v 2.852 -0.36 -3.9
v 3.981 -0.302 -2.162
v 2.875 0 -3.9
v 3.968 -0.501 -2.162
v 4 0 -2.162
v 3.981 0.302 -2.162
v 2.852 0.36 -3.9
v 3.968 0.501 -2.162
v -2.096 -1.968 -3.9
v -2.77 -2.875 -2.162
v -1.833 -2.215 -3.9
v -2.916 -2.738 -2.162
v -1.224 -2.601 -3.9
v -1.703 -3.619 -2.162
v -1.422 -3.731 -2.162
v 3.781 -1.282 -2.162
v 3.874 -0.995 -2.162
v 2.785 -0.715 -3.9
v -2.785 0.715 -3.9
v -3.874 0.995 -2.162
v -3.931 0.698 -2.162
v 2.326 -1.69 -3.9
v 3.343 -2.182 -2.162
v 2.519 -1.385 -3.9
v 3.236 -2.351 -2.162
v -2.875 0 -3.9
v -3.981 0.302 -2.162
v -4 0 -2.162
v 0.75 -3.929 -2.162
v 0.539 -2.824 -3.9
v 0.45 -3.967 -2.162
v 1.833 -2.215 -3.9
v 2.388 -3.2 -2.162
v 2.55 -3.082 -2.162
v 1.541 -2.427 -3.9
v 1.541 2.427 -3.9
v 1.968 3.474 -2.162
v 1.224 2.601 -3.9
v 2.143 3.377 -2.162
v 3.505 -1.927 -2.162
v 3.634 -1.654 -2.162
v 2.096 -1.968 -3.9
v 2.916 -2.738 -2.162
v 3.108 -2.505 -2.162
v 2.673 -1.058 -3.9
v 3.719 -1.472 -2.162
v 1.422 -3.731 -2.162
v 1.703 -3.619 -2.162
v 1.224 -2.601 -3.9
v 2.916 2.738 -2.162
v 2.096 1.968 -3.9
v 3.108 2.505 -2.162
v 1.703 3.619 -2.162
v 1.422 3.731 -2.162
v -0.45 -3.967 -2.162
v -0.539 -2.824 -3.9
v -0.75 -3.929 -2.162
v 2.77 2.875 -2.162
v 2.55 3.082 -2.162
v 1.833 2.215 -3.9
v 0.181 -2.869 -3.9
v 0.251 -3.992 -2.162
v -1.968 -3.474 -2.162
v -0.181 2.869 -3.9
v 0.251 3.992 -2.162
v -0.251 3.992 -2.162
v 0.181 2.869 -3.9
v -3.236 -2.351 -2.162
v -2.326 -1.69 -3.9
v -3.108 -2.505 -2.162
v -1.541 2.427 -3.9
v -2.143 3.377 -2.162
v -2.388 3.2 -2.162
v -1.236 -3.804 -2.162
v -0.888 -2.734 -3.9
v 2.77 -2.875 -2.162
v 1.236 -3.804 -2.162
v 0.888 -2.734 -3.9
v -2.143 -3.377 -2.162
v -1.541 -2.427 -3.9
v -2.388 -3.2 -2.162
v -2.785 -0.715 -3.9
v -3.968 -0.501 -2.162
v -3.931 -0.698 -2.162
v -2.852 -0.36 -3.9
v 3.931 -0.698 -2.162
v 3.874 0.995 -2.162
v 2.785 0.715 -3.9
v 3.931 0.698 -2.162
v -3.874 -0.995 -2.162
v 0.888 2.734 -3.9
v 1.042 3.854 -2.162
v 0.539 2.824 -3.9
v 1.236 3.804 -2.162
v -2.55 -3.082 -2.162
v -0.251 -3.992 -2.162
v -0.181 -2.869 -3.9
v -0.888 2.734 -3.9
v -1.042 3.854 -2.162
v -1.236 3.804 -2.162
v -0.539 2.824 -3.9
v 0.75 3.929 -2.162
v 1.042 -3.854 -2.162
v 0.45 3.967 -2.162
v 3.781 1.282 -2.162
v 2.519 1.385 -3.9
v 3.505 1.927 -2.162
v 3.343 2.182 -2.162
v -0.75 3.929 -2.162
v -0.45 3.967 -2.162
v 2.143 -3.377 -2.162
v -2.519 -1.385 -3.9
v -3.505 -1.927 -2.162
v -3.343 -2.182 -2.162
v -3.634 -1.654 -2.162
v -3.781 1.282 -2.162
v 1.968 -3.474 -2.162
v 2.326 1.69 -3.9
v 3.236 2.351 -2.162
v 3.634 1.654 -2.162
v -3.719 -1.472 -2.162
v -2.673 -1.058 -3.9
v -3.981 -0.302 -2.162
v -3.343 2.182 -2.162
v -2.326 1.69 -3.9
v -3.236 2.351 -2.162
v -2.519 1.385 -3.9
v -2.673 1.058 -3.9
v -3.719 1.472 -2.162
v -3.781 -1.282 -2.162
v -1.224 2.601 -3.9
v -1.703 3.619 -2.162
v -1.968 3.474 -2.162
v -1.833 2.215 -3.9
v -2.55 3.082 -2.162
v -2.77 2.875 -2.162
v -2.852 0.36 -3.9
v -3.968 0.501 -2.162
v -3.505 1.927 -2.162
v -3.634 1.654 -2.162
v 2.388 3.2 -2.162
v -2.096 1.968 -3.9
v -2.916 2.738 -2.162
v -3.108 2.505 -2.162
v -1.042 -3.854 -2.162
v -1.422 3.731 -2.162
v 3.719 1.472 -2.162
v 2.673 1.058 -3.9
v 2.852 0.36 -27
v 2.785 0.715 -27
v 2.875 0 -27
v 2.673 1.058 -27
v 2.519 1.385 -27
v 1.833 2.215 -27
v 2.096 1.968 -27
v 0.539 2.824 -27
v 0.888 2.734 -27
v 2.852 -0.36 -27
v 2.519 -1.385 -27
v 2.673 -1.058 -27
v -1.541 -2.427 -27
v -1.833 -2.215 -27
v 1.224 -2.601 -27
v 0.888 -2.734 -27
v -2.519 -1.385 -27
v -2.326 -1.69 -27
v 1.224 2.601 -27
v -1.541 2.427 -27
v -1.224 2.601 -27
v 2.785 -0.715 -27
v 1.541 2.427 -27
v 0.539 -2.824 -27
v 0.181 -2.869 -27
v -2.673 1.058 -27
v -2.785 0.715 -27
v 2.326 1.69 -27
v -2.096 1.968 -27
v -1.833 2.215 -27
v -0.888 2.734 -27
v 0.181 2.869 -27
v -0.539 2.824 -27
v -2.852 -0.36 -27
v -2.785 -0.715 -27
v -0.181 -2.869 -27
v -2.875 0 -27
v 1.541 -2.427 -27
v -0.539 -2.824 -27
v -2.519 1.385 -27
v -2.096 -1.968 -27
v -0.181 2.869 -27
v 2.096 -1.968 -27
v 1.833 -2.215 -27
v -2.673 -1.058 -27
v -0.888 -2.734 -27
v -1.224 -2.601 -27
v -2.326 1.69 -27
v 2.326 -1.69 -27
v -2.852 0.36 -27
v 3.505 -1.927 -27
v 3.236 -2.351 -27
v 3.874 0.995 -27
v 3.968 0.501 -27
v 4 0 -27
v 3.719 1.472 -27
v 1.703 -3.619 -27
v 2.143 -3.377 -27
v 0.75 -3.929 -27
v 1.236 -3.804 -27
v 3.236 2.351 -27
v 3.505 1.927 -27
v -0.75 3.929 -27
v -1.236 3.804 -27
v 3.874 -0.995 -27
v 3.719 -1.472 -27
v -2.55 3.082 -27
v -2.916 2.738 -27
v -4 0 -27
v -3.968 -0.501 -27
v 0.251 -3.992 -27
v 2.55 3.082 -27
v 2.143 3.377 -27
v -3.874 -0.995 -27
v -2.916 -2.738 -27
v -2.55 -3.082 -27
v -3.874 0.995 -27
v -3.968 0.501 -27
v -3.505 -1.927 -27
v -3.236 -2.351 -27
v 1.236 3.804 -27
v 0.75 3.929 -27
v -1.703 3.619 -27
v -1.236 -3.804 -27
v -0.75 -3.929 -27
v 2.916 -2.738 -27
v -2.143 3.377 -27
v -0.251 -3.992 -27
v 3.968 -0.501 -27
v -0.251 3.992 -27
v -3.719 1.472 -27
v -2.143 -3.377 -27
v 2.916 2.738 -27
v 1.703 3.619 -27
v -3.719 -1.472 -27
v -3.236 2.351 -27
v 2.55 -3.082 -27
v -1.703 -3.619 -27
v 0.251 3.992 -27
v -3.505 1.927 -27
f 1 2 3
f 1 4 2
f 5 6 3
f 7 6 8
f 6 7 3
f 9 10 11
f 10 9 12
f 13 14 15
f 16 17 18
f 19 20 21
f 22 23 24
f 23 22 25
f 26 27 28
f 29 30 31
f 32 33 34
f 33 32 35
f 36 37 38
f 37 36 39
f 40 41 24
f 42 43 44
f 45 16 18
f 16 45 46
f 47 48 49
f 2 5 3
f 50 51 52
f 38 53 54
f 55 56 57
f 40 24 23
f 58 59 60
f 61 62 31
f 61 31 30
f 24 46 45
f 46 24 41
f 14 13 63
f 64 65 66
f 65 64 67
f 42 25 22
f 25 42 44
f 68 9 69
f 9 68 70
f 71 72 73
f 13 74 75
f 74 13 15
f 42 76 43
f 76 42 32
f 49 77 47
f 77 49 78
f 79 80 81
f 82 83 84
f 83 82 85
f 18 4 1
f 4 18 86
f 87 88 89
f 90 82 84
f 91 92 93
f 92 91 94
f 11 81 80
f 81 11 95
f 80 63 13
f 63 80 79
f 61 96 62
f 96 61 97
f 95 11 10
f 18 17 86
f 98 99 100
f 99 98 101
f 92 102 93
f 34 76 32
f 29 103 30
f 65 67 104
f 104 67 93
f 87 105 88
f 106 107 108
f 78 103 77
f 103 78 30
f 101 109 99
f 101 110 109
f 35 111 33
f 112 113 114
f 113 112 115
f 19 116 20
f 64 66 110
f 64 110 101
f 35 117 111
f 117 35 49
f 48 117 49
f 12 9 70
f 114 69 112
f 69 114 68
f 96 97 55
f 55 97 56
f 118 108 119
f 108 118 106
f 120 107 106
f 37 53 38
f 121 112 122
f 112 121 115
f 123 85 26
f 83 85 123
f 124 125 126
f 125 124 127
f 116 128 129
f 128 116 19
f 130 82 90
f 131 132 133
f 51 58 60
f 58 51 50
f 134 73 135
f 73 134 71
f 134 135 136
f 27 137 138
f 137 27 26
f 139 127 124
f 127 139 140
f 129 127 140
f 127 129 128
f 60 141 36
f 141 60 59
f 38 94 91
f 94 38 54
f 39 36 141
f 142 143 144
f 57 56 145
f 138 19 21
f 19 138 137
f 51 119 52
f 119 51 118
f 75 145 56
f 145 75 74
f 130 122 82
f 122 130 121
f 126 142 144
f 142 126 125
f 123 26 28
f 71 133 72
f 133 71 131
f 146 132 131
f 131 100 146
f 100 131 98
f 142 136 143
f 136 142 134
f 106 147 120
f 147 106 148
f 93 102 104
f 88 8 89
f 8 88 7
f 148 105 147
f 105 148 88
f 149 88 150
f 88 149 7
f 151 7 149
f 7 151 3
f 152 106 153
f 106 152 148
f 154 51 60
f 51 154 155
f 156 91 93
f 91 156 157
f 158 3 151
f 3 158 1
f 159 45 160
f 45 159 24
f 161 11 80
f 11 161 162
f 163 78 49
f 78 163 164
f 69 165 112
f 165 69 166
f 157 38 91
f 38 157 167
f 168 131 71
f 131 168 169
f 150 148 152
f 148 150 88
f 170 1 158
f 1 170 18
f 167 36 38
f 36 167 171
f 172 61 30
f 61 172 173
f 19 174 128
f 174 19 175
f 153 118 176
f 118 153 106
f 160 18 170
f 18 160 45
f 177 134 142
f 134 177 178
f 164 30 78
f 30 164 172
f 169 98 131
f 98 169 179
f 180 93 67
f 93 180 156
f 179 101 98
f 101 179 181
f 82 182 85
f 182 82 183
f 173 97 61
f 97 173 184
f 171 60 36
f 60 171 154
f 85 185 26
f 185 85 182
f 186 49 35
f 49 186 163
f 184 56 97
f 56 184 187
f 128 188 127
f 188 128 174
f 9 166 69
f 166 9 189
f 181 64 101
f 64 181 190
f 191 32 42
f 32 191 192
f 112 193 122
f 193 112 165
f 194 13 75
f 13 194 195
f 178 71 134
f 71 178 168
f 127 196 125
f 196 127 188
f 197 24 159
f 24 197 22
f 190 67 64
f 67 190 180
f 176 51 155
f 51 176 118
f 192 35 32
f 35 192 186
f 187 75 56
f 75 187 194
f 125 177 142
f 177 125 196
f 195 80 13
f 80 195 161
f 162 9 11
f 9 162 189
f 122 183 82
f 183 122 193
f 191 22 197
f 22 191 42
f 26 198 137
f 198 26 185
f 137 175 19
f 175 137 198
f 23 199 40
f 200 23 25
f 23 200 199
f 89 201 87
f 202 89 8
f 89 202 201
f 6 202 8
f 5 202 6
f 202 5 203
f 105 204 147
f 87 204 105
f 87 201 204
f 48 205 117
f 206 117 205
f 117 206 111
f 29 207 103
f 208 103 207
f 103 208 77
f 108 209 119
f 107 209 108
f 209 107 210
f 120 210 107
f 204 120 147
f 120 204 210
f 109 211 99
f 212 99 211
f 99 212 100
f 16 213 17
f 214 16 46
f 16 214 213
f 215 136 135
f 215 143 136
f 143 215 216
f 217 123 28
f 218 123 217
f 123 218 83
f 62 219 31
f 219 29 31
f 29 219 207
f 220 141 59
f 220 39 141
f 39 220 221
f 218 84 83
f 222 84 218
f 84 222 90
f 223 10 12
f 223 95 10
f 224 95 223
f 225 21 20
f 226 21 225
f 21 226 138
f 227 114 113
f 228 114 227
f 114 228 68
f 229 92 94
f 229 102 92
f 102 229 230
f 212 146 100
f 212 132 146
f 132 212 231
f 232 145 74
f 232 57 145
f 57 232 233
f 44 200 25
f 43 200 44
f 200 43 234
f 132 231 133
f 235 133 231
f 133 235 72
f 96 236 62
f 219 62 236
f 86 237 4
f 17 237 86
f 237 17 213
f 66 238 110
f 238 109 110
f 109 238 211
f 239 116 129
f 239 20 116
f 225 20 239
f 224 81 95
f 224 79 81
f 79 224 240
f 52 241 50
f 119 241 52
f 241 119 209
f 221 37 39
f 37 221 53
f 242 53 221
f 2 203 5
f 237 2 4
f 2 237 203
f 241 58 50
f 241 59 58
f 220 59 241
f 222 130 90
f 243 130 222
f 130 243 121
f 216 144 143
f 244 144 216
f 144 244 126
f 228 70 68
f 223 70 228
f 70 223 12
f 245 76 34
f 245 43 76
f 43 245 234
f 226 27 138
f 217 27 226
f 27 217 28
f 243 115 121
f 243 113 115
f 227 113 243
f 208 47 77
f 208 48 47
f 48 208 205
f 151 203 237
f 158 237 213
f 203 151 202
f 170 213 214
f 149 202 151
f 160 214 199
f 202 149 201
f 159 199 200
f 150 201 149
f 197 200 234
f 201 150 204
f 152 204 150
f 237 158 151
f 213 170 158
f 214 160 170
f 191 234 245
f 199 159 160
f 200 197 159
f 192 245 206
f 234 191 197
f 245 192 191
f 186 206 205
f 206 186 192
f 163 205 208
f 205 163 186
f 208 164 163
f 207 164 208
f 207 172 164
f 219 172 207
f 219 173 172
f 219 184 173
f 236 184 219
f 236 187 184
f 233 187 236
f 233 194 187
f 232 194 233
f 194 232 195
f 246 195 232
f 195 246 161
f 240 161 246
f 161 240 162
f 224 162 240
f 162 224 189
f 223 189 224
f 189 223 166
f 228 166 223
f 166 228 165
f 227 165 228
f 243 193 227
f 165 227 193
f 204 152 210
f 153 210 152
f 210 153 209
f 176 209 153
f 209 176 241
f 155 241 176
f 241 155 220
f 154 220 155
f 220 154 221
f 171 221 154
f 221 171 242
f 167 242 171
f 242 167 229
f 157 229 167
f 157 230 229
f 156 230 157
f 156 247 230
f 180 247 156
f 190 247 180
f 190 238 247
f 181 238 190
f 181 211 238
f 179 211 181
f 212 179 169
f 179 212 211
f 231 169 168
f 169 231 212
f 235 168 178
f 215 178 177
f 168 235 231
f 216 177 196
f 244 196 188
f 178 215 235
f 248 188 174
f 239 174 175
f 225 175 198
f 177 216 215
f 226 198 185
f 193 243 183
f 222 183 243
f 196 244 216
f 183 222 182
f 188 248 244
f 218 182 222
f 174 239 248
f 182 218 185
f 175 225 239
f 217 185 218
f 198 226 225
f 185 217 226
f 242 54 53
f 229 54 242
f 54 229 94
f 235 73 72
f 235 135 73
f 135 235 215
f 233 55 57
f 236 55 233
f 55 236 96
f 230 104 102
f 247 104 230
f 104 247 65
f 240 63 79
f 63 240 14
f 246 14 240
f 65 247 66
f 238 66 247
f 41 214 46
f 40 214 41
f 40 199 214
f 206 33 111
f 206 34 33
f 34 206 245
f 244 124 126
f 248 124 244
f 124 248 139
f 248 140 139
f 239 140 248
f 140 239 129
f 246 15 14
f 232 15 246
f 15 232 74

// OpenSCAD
$fn = 50;

difference() {
	union() {
		translate(v = [0, 0, -27.0]) {
			cylinder(h = 27, r = 4.0);
		}
	}
	union() {
		translate(v = [0, 0, 0]) {
			rotate(a = [0, 0, 0]) {
				difference() {
					union() {
						translate(v = [0, 0, -30.0]) {
							cylinder(h = 30, r = 2.6);
						}
						translate(v = [0, 0, -3.9]) {
							cylinder(h = 3.9, r1 = 2.875, r2 = 5.4);
						}
						translate(v = [0, 0, -30.0]) {
							cylinder(h = 30, r = 2.875);
						}
						translate(v = [0, 0, -30.0]) {
							cylinder(h = 30, r = 2.6);
						}
					}
					union();
				}
			}
		}
	}
}
